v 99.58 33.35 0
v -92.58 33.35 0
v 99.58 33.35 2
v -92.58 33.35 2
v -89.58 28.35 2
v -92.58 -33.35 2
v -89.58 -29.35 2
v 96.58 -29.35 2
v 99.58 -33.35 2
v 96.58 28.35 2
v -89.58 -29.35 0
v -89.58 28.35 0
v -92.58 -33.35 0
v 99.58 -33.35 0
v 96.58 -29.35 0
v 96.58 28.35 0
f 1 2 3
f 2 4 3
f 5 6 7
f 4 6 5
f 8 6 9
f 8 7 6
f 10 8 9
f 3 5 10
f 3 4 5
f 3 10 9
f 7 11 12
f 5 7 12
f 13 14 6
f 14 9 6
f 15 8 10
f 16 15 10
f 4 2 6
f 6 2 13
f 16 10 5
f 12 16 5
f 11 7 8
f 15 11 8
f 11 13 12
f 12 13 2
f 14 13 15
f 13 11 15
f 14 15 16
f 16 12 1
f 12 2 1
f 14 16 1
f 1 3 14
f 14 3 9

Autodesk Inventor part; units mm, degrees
ref_plane "YZ Plane" through (0, 0, 0) normal (1, 0, 0) x (0, 1, 0)
ref_plane "XZ Plane" through (0, 0, 0) normal (0, 1, 0) x (-1, 0, 0)
ref_plane "XY Plane" through (0, 0, 0) normal (0, 0, 1) x (1, 0, 0)
sketch "Sketch1" plane through (0, 0, 0) normal (0, 0, 1) x (1, 0, 0)
  line L0 (0, 0) -> (92.58, 0)
  line L1 (92.58, 0) -> (92.58, 33.35)
  line L2 (92.58, 33.35) -> (-92.58, 33.35)
  line L3 (-92.58, 33.35) -> (-92.58, -33.35)
  line L4 (-92.58, -33.35) -> (92.58, -33.35)
  line L5 (92.58, -33.35) -> (92.58, 33.35)
  line L6 (-92.58, 33.35) -> (-89.58, 33.35)
  line L7 (-89.58, 33.35) -> (-89.58, 28.35)
  line L8 (92.58, -33.35) -> (89.58, -33.35)
  line L9 (89.58, -33.35) -> (89.58, -28.35)
  line L10 (-89.58, 28.35) -> (89.58, 28.35)
  line L11 (89.58, 28.35) -> (89.58, -28.35)
  line L12 (89.58, -28.35) -> (-89.58, -28.35)
  line L13 (-89.58, -28.35) -> (-89.58, 28.35)
  dimension "d0" = 92.58
  dimension "d1" = 33.35
  dimension "d2" = 185.16
  dimension "d3" = 66.7
  dimension "d4" = 3
  dimension "d5" = 5
  dimension "d6" = 3
  dimension "d7" = 5
extrude "Extrusion1" add sketch "Sketch1" along normal blind 2 contours L11 L10 L7 L2 L1 L0 | L0 L5 L4 L9 L11 | L9 L4 L3 L2 L7 L13 L12
sketch "Sketch2" plane through (-89.58, -28.35, 0) normal (0, 1, 0) x (1, 0, 0)
  line L0 (179.16, -2) -> (0, -2) projected
  line L1 (0, 0) -> (179.16, 0)
  line L2 (179.16, 0) -> (179.16, -2)
  line L3 (179.16, -2) -> (0, -2)
  line L4 (0, -2) -> (0, 0)
  point P0 (89.58, 0)
extrude "Extrusion2" cut sketch "Sketch2" against normal blind 1
sketch "Sketch3" plane through (0, 0, 2) normal (0, 0, 1) x (1, 0, 0)
  point P0 (0, 0)
sketch "Sketch4" plane through (0, 0, 2) normal (0, 0, 1) x (1, 0, 0)
  line L0 (92.58, -33.35) -> (92.58, 33.35) projected
  line L1 (92.58, 33.35) -> (99.58, 33.35)
  line L2 (99.58, 33.35) -> (99.58, -33.35)
  line L3 (99.58, -33.35) -> (92.58, -33.35)
  line L4 (89.58, 28.35) -> (89.58, -29.35) projected
  line L5 (89.58, -29.35) -> (96.58, -29.35)
  line L6 (96.58, -29.35) -> (96.58, 28.35)
  line L7 (96.58, 28.35) -> (89.58, 28.35)
  point P0 (0, 0)
  point P1 (92.58, 28.35)
  point P2 (92.58, -29.35)
  dimension "d12" = 7
  dimension "d13" = 90
  dimension "d14" = 7
  dimension "d15" = 90
extrude "Extrusion3" add sketch "Sketch4" against normal blind 2 contours L0 L5 L6 L7 L1 L2 L3
sketch "Sketch5" plane through (0, 0, 2) normal (0, 0, 1) x (1, 0, 0)
  line L0 (-89.58, 28.35) -> (89.58, 28.35) projected
  line L1 (96.58, -29.35) -> (92.58, -29.35) projected
  line L2 (89.58, 28.35) -> (92.58, 28.35)
  line L3 (92.58, 28.35) -> (92.58, -29.35)
  line L4 (92.58, -29.35) -> (89.58, -29.35)
  line L5 (89.58, -29.35) -> (89.58, 28.35)
  point P0 (0, 0)
extrude "Extrusion4" cut sketch "Sketch5" against normal blind 2
equation "\"d2\" = 2 * d0"
equation "\"d3\" = 2 * d1"
properties part number "Front cover"
